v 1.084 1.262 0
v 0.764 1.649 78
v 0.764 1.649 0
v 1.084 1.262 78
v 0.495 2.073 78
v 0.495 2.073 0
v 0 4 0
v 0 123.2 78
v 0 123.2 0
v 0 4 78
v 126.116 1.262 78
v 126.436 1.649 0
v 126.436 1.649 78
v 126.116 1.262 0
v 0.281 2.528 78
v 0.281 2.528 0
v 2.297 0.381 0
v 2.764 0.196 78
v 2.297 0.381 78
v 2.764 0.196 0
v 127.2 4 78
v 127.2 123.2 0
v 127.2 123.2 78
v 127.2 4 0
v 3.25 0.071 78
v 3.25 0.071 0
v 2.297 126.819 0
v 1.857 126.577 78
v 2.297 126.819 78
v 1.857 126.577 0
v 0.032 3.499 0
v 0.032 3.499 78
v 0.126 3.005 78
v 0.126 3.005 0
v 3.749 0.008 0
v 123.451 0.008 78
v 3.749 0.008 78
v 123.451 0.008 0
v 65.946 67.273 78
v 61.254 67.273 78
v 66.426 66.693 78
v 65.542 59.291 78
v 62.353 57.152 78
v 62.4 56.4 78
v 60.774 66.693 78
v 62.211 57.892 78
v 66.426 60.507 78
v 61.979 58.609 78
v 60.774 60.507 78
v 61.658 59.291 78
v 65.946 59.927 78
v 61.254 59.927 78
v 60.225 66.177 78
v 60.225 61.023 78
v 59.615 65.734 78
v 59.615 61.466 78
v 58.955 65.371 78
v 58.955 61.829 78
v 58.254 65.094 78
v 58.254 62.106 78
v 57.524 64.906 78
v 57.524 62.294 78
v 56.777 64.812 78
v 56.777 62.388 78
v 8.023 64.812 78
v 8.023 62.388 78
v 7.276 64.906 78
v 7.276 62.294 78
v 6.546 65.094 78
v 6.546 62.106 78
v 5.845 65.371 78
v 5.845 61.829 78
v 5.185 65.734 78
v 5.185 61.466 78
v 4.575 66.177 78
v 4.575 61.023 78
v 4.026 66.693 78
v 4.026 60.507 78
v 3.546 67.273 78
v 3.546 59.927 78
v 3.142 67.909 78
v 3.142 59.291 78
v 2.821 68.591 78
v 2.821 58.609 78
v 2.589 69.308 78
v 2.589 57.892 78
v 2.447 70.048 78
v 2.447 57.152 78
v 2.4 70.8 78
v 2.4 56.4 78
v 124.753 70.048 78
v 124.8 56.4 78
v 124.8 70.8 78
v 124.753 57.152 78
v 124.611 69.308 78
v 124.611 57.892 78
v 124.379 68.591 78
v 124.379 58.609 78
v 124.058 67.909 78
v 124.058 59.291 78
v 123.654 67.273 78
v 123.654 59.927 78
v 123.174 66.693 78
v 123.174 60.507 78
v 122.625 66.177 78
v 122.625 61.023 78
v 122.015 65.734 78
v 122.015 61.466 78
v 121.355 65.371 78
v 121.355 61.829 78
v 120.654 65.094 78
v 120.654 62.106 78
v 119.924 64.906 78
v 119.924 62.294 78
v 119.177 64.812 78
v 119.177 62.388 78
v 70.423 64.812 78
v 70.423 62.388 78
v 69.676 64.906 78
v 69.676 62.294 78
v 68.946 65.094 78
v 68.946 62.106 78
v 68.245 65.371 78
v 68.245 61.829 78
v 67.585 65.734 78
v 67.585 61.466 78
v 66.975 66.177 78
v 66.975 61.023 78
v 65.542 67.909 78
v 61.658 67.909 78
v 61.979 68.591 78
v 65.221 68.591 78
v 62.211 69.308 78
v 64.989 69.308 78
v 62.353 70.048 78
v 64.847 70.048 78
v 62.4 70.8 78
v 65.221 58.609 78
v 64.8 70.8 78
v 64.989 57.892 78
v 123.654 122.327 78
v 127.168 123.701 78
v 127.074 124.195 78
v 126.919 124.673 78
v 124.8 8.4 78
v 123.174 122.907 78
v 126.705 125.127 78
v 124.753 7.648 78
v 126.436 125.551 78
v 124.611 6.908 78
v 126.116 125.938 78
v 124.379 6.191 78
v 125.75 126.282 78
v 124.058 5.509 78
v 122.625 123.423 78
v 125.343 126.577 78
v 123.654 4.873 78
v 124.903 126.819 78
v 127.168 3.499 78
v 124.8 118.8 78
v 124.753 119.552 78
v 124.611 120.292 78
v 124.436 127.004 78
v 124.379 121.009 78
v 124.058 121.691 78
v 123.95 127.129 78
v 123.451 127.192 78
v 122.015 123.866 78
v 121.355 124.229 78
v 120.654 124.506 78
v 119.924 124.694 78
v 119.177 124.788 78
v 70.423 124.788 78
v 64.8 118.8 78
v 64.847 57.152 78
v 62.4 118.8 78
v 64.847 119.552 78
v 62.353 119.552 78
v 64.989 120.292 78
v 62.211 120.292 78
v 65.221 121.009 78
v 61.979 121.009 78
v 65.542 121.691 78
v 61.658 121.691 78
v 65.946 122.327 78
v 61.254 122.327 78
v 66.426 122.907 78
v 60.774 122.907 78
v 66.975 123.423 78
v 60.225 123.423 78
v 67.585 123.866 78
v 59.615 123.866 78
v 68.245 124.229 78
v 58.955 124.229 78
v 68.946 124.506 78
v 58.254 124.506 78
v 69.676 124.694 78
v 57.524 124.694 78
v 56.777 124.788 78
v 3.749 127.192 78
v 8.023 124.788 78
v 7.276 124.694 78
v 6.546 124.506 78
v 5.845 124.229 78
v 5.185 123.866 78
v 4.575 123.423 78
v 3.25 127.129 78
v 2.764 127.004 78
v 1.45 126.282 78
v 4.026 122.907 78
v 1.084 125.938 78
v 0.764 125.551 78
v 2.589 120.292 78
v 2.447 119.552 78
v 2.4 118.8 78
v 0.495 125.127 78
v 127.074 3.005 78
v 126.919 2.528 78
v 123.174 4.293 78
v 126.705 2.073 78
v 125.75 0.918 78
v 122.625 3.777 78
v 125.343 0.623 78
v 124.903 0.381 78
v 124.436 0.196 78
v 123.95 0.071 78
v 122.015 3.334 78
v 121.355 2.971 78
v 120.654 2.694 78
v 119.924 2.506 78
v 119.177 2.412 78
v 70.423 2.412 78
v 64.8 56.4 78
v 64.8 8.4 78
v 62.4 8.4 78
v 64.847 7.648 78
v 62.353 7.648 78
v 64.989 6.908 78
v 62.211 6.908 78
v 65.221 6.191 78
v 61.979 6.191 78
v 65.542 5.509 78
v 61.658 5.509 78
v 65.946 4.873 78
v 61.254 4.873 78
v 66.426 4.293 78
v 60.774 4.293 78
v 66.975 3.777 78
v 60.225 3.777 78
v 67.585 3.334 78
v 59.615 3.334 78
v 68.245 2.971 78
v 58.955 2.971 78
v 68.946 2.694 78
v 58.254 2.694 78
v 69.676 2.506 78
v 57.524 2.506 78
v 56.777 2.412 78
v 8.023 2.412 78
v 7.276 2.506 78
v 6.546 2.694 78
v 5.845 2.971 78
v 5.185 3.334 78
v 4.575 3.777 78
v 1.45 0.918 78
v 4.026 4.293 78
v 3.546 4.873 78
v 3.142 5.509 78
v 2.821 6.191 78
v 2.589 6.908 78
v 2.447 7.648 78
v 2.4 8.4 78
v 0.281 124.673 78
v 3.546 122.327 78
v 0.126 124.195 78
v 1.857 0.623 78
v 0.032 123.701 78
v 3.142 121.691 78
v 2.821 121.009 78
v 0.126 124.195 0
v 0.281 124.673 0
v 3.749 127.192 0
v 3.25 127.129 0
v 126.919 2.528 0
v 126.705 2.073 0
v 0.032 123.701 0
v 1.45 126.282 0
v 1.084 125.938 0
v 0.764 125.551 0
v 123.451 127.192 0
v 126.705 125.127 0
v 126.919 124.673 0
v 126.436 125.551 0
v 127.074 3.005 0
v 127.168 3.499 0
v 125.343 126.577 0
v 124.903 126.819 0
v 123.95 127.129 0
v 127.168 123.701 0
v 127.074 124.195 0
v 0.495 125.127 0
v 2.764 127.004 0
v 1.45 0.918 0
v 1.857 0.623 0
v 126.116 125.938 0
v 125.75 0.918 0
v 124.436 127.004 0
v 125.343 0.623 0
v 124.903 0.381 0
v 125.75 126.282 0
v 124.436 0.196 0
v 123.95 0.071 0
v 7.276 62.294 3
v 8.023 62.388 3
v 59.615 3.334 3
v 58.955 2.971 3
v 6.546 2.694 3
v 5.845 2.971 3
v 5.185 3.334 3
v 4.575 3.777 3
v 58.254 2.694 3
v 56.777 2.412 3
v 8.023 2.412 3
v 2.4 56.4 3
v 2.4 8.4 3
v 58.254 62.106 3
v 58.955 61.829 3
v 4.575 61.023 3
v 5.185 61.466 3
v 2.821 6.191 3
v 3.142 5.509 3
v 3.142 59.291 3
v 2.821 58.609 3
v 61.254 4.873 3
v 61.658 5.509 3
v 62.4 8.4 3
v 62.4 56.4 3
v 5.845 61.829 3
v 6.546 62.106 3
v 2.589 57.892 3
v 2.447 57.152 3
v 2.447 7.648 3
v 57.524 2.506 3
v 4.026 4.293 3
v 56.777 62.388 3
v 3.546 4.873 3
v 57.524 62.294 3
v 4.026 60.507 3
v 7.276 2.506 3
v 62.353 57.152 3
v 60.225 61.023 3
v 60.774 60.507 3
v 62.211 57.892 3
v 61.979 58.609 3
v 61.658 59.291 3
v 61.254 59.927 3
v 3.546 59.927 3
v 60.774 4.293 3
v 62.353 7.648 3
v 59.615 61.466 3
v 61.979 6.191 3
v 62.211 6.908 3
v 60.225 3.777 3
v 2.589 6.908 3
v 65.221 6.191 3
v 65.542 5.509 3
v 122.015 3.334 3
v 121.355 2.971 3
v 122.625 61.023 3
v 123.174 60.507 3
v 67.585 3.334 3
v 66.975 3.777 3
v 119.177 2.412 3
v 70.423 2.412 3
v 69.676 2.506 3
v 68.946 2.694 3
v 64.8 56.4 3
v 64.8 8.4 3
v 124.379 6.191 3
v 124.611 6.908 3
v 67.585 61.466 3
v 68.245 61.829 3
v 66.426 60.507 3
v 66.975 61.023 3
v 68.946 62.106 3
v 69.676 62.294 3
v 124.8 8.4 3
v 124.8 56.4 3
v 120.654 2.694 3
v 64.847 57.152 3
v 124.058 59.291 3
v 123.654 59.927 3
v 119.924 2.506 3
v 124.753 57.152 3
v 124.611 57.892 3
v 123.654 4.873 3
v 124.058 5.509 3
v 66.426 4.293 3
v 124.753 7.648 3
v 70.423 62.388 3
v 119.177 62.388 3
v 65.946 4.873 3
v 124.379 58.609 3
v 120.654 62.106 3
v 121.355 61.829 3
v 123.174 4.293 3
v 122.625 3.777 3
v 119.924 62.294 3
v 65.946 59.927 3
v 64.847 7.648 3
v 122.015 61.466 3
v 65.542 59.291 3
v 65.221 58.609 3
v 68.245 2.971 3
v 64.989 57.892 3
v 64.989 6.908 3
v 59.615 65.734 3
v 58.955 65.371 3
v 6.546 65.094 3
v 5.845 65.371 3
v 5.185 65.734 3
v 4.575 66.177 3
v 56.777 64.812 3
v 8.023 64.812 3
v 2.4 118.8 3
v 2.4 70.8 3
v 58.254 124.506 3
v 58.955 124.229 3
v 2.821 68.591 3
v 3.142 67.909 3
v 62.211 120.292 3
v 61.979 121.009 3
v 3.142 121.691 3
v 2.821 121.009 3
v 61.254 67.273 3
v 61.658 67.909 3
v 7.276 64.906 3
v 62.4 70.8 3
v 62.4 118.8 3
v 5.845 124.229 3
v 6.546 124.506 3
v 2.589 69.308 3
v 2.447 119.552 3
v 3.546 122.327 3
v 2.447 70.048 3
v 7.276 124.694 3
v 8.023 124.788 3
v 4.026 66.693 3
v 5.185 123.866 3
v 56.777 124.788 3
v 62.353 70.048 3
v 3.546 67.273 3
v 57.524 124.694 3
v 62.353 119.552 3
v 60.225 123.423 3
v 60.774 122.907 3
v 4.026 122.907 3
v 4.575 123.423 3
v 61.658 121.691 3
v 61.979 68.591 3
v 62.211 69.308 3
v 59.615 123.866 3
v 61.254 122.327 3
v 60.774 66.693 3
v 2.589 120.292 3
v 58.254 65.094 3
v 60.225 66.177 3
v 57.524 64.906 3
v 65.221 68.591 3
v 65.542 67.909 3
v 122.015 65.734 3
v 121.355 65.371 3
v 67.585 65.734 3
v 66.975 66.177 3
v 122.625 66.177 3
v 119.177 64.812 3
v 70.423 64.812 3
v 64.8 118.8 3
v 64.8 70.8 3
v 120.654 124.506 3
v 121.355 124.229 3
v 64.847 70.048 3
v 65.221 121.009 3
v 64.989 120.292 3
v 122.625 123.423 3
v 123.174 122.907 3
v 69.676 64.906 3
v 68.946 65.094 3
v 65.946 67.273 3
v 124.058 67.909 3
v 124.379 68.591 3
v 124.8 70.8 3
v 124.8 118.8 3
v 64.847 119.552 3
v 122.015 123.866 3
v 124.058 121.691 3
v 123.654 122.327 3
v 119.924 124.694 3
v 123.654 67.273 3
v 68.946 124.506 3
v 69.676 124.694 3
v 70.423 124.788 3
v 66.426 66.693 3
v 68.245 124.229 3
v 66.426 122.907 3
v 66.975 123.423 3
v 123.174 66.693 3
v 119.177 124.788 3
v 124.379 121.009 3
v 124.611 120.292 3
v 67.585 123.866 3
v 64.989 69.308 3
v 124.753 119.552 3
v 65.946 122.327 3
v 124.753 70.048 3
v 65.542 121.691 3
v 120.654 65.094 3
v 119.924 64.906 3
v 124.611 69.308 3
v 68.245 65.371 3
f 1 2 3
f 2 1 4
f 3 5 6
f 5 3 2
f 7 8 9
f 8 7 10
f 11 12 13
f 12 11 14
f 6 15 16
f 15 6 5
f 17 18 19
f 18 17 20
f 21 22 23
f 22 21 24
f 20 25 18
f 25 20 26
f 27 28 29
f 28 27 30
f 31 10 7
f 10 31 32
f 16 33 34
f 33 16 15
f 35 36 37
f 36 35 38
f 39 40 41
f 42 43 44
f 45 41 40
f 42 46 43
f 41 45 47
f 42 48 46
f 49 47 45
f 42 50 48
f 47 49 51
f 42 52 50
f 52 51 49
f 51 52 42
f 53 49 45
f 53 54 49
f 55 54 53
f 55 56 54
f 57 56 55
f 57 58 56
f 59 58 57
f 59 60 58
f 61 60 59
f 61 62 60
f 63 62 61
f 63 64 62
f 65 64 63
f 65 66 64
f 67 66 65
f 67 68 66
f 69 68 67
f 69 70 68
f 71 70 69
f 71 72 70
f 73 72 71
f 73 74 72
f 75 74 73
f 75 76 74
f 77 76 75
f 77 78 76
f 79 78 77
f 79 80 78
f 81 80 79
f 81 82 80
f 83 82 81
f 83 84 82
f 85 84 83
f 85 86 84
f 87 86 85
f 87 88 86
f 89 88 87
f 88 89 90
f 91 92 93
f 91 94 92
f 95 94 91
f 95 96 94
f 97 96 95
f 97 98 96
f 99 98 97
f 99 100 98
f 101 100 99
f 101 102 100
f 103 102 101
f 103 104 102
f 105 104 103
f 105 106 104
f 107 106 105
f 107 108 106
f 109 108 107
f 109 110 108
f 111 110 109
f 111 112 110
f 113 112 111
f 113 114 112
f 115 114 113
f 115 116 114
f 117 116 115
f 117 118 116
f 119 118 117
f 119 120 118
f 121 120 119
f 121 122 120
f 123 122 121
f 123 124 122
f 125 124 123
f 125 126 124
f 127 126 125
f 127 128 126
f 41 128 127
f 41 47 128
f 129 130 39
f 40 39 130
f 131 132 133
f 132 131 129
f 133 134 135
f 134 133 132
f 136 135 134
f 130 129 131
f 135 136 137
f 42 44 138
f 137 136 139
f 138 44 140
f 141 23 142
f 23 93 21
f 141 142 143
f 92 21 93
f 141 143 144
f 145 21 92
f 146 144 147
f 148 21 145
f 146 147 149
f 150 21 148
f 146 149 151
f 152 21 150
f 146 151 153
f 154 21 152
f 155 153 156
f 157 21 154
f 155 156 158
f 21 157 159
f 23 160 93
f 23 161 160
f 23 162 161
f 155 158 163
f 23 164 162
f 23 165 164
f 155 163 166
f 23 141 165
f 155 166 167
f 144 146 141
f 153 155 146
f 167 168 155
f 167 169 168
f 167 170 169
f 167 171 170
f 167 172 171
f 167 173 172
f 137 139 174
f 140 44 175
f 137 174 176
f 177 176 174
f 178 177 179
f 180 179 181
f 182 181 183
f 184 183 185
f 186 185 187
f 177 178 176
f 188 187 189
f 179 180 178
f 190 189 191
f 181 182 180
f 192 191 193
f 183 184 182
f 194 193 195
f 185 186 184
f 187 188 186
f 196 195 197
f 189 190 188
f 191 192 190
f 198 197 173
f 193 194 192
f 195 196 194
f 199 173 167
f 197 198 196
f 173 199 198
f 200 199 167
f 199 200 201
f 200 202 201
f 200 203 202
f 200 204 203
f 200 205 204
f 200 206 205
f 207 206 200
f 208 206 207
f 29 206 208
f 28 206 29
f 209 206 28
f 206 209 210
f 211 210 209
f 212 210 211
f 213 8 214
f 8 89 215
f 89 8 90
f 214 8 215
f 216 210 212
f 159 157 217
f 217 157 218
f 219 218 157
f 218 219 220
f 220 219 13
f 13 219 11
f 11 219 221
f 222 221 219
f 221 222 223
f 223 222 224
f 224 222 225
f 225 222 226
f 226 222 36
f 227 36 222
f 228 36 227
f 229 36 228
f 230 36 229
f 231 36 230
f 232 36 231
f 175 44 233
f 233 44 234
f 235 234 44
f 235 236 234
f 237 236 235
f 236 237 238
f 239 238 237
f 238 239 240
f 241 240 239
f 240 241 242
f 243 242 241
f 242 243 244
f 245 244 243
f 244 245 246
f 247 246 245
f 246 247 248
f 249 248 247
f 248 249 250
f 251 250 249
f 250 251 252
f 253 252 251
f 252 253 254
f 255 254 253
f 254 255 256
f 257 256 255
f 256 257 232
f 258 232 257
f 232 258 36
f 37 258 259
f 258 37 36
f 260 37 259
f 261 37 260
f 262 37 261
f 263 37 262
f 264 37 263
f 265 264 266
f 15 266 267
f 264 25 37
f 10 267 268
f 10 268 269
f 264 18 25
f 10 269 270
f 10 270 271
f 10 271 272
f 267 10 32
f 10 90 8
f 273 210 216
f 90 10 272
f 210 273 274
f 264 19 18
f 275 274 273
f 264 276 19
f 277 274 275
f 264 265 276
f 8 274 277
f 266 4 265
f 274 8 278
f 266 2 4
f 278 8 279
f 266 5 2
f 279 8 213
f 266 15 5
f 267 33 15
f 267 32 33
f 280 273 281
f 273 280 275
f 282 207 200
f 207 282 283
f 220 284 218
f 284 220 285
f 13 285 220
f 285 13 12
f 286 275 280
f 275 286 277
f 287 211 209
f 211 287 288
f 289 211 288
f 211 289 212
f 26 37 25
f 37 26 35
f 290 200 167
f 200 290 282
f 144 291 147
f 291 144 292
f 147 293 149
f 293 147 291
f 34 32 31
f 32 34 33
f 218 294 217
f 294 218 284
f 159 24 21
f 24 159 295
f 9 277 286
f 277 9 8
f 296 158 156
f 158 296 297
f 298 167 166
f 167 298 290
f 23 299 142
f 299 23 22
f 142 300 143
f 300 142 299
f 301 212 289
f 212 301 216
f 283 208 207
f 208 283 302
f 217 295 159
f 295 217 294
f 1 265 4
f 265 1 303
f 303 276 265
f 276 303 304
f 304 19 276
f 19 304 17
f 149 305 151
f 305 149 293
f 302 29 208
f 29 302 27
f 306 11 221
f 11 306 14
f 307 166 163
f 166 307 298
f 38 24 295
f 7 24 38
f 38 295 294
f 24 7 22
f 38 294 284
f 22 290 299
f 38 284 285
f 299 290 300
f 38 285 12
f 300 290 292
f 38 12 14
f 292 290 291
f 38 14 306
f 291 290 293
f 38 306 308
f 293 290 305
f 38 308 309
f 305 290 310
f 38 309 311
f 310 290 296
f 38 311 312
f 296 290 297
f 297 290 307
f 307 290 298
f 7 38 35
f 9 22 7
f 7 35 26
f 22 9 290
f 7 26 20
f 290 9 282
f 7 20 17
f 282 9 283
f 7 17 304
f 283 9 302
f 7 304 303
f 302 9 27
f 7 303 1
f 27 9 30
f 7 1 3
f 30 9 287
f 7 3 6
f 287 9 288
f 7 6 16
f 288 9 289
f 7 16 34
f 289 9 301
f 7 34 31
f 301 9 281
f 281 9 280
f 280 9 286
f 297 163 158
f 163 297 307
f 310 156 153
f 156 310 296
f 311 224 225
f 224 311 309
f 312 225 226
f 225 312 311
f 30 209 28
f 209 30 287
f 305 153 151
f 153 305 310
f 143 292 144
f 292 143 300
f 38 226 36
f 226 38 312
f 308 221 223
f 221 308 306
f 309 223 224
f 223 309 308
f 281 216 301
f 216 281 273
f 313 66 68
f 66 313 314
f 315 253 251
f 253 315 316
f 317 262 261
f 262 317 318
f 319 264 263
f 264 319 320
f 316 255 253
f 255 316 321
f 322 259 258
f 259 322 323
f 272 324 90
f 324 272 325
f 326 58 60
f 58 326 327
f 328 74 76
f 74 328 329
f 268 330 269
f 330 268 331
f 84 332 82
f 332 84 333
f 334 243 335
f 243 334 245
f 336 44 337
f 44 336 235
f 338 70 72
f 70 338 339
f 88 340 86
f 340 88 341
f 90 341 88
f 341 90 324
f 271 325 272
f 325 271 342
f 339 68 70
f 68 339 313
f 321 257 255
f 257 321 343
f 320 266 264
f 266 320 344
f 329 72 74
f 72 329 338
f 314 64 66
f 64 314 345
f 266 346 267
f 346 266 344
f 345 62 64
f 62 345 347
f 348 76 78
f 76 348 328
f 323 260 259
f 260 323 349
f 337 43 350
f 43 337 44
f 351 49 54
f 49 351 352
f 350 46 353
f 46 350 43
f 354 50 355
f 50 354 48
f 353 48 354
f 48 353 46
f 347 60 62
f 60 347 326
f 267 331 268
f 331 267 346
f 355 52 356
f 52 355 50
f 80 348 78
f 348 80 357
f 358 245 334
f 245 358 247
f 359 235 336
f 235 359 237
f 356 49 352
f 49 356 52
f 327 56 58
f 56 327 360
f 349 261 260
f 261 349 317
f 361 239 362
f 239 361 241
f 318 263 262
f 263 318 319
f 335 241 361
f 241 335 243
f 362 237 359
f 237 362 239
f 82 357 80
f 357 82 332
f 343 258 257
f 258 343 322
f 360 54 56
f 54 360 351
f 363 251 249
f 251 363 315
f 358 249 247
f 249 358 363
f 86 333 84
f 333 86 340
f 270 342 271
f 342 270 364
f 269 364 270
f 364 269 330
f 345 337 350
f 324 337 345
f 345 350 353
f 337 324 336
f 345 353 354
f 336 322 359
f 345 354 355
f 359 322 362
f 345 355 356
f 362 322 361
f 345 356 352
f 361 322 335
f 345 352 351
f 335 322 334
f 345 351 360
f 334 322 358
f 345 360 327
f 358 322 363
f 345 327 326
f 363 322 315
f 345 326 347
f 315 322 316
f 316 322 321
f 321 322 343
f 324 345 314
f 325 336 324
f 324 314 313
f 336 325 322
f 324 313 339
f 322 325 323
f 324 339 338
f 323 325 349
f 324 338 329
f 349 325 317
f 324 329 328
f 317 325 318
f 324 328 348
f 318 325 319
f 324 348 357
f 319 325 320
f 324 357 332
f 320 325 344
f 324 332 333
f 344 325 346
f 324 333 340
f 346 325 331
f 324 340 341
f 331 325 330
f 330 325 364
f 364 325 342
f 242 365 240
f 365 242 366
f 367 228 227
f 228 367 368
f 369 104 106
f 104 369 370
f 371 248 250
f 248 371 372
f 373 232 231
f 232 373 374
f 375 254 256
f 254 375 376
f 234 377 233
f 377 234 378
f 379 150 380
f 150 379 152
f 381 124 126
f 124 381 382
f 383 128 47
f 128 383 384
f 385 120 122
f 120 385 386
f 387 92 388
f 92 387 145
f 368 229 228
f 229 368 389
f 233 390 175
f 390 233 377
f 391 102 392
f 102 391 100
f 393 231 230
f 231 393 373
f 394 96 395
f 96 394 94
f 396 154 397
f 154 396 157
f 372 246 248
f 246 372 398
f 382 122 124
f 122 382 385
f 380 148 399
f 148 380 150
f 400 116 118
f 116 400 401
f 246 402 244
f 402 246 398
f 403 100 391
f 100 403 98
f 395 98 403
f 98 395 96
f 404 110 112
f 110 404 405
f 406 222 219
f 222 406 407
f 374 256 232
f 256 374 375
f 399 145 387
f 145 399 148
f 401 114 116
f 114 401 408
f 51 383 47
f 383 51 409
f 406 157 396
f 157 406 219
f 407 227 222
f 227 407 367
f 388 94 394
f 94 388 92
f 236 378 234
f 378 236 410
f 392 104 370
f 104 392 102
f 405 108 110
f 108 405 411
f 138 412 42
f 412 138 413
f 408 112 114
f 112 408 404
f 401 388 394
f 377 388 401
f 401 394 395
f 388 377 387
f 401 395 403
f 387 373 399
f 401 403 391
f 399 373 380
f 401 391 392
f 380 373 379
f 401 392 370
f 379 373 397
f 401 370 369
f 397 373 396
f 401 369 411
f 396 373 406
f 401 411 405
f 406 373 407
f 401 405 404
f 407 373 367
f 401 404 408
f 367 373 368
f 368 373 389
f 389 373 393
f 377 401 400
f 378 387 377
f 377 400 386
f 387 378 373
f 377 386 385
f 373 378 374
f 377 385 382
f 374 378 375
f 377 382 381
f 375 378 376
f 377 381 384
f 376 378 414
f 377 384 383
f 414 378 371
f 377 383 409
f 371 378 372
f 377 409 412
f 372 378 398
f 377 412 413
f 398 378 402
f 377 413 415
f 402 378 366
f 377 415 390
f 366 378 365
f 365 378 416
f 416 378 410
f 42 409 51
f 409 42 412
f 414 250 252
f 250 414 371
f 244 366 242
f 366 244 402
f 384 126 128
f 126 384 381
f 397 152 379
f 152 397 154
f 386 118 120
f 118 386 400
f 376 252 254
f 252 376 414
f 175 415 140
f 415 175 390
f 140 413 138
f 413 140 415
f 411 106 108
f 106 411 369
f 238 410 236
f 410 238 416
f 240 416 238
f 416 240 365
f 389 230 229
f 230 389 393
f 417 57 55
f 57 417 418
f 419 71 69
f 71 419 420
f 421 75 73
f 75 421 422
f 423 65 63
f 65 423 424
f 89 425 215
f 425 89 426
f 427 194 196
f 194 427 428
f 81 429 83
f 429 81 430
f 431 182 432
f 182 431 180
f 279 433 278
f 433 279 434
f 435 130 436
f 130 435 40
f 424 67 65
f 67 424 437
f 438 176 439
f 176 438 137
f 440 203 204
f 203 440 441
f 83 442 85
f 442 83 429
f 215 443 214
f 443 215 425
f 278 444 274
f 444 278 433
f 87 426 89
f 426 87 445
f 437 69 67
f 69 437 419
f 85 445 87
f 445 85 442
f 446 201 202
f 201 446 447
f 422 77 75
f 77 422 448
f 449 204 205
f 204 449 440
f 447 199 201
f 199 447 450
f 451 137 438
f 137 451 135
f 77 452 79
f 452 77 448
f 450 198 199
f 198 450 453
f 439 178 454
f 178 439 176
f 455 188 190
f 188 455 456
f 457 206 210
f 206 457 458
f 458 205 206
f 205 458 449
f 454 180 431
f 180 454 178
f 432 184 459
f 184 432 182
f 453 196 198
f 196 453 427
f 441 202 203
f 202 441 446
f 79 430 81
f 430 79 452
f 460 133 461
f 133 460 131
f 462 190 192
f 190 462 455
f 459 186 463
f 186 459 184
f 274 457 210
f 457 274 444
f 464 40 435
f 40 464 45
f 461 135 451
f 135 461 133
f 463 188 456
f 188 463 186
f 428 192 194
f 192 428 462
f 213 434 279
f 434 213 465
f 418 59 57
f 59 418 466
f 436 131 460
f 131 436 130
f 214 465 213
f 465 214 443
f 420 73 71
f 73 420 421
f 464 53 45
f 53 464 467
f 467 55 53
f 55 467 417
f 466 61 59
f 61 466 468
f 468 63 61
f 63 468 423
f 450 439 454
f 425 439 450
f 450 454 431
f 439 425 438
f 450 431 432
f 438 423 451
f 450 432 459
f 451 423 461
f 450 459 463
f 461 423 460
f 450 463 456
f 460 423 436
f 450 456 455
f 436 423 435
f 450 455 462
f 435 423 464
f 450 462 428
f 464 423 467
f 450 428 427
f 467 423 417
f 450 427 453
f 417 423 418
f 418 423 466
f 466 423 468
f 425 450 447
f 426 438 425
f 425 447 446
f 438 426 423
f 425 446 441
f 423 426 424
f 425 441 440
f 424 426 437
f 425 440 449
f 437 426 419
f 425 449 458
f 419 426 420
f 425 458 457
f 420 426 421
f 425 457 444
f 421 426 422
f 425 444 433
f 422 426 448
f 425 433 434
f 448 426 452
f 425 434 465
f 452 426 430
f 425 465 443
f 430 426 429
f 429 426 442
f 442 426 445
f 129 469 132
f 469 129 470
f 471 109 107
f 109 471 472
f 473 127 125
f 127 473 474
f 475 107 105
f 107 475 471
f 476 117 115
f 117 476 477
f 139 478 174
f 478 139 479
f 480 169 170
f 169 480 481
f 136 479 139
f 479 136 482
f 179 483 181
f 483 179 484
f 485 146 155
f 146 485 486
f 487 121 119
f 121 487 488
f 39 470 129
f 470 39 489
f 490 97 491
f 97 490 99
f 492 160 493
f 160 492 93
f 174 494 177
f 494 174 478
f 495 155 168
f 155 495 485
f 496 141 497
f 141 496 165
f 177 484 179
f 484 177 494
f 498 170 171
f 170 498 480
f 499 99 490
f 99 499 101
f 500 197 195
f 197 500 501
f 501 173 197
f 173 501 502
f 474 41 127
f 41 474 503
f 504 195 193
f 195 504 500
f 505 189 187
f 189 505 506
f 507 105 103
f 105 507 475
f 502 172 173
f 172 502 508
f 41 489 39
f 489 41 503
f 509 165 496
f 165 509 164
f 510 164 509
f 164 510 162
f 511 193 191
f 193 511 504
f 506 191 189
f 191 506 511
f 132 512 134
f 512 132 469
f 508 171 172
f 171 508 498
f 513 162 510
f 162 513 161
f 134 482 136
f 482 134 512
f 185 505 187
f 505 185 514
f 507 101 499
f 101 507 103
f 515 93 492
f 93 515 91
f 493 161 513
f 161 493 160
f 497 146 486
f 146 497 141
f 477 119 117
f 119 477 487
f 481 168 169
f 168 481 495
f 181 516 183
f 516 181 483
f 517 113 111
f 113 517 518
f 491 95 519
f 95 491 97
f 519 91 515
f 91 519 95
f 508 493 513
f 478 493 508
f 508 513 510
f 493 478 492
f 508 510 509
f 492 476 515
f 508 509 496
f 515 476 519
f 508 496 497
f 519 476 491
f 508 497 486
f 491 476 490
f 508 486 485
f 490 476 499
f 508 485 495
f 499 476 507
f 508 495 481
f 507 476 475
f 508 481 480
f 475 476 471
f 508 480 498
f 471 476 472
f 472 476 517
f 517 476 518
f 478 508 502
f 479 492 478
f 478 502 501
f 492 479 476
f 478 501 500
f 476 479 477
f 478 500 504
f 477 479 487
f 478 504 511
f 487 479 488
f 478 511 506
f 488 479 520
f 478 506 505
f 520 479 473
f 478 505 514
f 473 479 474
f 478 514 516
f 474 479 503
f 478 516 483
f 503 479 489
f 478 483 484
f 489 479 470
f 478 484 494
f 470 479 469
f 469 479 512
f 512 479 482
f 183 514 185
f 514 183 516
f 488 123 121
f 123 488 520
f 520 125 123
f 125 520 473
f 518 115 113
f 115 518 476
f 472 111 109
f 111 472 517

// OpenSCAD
difference() {
  difference() {
    difference() {
      difference() {
        hull() {
          hull() {
            hull() {
              translate([4, 0, 0]) {
                translate([0, 4, 0]) {
                  cylinder(h = 78, r = 4);
                }
              }
              translate([123.2, 0, 0]) {
                translate([0, 4, 0]) {
                  cylinder(h = 78, r = 4);
                }
              }
            }
            translate([4, 0, 0]) {
              translate([0, 123.2, 0]) {
                cylinder(h = 78, r = 4);
              }
            }
          }
          translate([123.2, 0, 0]) {
            translate([0, 123.2, 0]) {
              cylinder(h = 78, r = 4);
            }
          }
        }
        translate([2.4, 0, 0]) {
          translate([0, 2.4, 0]) {
            translate([0, 0, 3]) {
              hull() {
                hull() {
                  hull() {
                    translate([6, 0, 0]) {
                      translate([0, 6, 0]) {
                        cylinder(h = 76, r = 6);
                      }
                    }
                    translate([54, 0, 0]) {
                      translate([0, 6, 0]) {
                        cylinder(h = 76, r = 6);
                      }
                    }
                  }
                  translate([6, 0, 0]) {
                    translate([0, 54, 0]) {
                      cylinder(h = 76, r = 6);
                    }
                  }
                }
                translate([54, 0, 0]) {
                  translate([0, 54, 0]) {
                    cylinder(h = 76, r = 6);
                  }
                }
              }
            }
          }
        }
      }
      translate([64.8, 0, 0]) {
        translate([0, 2.4, 0]) {
          translate([0, 0, 3]) {
            hull() {
              hull() {
                hull() {
                  translate([6, 0, 0]) {
                    translate([0, 6, 0]) {
                      cylinder(h = 76, r = 6);
                    }
                  }
                  translate([54, 0, 0]) {
                    translate([0, 6, 0]) {
                      cylinder(h = 76, r = 6);
                    }
                  }
                }
                translate([6, 0, 0]) {
                  translate([0, 54, 0]) {
                    cylinder(h = 76, r = 6);
                  }
                }
              }
              translate([54, 0, 0]) {
                translate([0, 54, 0]) {
                  cylinder(h = 76, r = 6);
                }
              }
            }
          }
        }
      }
    }
    translate([2.4, 0, 0]) {
      translate([0, 64.8, 0]) {
        translate([0, 0, 3]) {
          hull() {
            hull() {
              hull() {
                translate([6, 0, 0]) {
                  translate([0, 6, 0]) {
                    cylinder(h = 76, r = 6);
                  }
                }
                translate([54, 0, 0]) {
                  translate([0, 6, 0]) {
                    cylinder(h = 76, r = 6);
                  }
                }
              }
              translate([6, 0, 0]) {
                translate([0, 54, 0]) {
                  cylinder(h = 76, r = 6);
                }
              }
            }
            translate([54, 0, 0]) {
              translate([0, 54, 0]) {
                cylinder(h = 76, r = 6);
              }
            }
          }
        }
      }
    }
  }
  translate([64.8, 0, 0]) {
    translate([0, 64.8, 0]) {
      translate([0, 0, 3]) {
        hull() {
          hull() {
            hull() {
              translate([6, 0, 0]) {
                translate([0, 6, 0]) {
                  cylinder(h = 76, r = 6);
                }
              }
              translate([54, 0, 0]) {
                translate([0, 6, 0]) {
                  cylinder(h = 76, r = 6);
                }
              }
            }
            translate([6, 0, 0]) {
              translate([0, 54, 0]) {
                cylinder(h = 76, r = 6);
              }
            }
          }
          translate([54, 0, 0]) {
            translate([0, 54, 0]) {
              cylinder(h = 76, r = 6);
            }
          }
        }
      }
    }
  }
}
$fn = 50;
